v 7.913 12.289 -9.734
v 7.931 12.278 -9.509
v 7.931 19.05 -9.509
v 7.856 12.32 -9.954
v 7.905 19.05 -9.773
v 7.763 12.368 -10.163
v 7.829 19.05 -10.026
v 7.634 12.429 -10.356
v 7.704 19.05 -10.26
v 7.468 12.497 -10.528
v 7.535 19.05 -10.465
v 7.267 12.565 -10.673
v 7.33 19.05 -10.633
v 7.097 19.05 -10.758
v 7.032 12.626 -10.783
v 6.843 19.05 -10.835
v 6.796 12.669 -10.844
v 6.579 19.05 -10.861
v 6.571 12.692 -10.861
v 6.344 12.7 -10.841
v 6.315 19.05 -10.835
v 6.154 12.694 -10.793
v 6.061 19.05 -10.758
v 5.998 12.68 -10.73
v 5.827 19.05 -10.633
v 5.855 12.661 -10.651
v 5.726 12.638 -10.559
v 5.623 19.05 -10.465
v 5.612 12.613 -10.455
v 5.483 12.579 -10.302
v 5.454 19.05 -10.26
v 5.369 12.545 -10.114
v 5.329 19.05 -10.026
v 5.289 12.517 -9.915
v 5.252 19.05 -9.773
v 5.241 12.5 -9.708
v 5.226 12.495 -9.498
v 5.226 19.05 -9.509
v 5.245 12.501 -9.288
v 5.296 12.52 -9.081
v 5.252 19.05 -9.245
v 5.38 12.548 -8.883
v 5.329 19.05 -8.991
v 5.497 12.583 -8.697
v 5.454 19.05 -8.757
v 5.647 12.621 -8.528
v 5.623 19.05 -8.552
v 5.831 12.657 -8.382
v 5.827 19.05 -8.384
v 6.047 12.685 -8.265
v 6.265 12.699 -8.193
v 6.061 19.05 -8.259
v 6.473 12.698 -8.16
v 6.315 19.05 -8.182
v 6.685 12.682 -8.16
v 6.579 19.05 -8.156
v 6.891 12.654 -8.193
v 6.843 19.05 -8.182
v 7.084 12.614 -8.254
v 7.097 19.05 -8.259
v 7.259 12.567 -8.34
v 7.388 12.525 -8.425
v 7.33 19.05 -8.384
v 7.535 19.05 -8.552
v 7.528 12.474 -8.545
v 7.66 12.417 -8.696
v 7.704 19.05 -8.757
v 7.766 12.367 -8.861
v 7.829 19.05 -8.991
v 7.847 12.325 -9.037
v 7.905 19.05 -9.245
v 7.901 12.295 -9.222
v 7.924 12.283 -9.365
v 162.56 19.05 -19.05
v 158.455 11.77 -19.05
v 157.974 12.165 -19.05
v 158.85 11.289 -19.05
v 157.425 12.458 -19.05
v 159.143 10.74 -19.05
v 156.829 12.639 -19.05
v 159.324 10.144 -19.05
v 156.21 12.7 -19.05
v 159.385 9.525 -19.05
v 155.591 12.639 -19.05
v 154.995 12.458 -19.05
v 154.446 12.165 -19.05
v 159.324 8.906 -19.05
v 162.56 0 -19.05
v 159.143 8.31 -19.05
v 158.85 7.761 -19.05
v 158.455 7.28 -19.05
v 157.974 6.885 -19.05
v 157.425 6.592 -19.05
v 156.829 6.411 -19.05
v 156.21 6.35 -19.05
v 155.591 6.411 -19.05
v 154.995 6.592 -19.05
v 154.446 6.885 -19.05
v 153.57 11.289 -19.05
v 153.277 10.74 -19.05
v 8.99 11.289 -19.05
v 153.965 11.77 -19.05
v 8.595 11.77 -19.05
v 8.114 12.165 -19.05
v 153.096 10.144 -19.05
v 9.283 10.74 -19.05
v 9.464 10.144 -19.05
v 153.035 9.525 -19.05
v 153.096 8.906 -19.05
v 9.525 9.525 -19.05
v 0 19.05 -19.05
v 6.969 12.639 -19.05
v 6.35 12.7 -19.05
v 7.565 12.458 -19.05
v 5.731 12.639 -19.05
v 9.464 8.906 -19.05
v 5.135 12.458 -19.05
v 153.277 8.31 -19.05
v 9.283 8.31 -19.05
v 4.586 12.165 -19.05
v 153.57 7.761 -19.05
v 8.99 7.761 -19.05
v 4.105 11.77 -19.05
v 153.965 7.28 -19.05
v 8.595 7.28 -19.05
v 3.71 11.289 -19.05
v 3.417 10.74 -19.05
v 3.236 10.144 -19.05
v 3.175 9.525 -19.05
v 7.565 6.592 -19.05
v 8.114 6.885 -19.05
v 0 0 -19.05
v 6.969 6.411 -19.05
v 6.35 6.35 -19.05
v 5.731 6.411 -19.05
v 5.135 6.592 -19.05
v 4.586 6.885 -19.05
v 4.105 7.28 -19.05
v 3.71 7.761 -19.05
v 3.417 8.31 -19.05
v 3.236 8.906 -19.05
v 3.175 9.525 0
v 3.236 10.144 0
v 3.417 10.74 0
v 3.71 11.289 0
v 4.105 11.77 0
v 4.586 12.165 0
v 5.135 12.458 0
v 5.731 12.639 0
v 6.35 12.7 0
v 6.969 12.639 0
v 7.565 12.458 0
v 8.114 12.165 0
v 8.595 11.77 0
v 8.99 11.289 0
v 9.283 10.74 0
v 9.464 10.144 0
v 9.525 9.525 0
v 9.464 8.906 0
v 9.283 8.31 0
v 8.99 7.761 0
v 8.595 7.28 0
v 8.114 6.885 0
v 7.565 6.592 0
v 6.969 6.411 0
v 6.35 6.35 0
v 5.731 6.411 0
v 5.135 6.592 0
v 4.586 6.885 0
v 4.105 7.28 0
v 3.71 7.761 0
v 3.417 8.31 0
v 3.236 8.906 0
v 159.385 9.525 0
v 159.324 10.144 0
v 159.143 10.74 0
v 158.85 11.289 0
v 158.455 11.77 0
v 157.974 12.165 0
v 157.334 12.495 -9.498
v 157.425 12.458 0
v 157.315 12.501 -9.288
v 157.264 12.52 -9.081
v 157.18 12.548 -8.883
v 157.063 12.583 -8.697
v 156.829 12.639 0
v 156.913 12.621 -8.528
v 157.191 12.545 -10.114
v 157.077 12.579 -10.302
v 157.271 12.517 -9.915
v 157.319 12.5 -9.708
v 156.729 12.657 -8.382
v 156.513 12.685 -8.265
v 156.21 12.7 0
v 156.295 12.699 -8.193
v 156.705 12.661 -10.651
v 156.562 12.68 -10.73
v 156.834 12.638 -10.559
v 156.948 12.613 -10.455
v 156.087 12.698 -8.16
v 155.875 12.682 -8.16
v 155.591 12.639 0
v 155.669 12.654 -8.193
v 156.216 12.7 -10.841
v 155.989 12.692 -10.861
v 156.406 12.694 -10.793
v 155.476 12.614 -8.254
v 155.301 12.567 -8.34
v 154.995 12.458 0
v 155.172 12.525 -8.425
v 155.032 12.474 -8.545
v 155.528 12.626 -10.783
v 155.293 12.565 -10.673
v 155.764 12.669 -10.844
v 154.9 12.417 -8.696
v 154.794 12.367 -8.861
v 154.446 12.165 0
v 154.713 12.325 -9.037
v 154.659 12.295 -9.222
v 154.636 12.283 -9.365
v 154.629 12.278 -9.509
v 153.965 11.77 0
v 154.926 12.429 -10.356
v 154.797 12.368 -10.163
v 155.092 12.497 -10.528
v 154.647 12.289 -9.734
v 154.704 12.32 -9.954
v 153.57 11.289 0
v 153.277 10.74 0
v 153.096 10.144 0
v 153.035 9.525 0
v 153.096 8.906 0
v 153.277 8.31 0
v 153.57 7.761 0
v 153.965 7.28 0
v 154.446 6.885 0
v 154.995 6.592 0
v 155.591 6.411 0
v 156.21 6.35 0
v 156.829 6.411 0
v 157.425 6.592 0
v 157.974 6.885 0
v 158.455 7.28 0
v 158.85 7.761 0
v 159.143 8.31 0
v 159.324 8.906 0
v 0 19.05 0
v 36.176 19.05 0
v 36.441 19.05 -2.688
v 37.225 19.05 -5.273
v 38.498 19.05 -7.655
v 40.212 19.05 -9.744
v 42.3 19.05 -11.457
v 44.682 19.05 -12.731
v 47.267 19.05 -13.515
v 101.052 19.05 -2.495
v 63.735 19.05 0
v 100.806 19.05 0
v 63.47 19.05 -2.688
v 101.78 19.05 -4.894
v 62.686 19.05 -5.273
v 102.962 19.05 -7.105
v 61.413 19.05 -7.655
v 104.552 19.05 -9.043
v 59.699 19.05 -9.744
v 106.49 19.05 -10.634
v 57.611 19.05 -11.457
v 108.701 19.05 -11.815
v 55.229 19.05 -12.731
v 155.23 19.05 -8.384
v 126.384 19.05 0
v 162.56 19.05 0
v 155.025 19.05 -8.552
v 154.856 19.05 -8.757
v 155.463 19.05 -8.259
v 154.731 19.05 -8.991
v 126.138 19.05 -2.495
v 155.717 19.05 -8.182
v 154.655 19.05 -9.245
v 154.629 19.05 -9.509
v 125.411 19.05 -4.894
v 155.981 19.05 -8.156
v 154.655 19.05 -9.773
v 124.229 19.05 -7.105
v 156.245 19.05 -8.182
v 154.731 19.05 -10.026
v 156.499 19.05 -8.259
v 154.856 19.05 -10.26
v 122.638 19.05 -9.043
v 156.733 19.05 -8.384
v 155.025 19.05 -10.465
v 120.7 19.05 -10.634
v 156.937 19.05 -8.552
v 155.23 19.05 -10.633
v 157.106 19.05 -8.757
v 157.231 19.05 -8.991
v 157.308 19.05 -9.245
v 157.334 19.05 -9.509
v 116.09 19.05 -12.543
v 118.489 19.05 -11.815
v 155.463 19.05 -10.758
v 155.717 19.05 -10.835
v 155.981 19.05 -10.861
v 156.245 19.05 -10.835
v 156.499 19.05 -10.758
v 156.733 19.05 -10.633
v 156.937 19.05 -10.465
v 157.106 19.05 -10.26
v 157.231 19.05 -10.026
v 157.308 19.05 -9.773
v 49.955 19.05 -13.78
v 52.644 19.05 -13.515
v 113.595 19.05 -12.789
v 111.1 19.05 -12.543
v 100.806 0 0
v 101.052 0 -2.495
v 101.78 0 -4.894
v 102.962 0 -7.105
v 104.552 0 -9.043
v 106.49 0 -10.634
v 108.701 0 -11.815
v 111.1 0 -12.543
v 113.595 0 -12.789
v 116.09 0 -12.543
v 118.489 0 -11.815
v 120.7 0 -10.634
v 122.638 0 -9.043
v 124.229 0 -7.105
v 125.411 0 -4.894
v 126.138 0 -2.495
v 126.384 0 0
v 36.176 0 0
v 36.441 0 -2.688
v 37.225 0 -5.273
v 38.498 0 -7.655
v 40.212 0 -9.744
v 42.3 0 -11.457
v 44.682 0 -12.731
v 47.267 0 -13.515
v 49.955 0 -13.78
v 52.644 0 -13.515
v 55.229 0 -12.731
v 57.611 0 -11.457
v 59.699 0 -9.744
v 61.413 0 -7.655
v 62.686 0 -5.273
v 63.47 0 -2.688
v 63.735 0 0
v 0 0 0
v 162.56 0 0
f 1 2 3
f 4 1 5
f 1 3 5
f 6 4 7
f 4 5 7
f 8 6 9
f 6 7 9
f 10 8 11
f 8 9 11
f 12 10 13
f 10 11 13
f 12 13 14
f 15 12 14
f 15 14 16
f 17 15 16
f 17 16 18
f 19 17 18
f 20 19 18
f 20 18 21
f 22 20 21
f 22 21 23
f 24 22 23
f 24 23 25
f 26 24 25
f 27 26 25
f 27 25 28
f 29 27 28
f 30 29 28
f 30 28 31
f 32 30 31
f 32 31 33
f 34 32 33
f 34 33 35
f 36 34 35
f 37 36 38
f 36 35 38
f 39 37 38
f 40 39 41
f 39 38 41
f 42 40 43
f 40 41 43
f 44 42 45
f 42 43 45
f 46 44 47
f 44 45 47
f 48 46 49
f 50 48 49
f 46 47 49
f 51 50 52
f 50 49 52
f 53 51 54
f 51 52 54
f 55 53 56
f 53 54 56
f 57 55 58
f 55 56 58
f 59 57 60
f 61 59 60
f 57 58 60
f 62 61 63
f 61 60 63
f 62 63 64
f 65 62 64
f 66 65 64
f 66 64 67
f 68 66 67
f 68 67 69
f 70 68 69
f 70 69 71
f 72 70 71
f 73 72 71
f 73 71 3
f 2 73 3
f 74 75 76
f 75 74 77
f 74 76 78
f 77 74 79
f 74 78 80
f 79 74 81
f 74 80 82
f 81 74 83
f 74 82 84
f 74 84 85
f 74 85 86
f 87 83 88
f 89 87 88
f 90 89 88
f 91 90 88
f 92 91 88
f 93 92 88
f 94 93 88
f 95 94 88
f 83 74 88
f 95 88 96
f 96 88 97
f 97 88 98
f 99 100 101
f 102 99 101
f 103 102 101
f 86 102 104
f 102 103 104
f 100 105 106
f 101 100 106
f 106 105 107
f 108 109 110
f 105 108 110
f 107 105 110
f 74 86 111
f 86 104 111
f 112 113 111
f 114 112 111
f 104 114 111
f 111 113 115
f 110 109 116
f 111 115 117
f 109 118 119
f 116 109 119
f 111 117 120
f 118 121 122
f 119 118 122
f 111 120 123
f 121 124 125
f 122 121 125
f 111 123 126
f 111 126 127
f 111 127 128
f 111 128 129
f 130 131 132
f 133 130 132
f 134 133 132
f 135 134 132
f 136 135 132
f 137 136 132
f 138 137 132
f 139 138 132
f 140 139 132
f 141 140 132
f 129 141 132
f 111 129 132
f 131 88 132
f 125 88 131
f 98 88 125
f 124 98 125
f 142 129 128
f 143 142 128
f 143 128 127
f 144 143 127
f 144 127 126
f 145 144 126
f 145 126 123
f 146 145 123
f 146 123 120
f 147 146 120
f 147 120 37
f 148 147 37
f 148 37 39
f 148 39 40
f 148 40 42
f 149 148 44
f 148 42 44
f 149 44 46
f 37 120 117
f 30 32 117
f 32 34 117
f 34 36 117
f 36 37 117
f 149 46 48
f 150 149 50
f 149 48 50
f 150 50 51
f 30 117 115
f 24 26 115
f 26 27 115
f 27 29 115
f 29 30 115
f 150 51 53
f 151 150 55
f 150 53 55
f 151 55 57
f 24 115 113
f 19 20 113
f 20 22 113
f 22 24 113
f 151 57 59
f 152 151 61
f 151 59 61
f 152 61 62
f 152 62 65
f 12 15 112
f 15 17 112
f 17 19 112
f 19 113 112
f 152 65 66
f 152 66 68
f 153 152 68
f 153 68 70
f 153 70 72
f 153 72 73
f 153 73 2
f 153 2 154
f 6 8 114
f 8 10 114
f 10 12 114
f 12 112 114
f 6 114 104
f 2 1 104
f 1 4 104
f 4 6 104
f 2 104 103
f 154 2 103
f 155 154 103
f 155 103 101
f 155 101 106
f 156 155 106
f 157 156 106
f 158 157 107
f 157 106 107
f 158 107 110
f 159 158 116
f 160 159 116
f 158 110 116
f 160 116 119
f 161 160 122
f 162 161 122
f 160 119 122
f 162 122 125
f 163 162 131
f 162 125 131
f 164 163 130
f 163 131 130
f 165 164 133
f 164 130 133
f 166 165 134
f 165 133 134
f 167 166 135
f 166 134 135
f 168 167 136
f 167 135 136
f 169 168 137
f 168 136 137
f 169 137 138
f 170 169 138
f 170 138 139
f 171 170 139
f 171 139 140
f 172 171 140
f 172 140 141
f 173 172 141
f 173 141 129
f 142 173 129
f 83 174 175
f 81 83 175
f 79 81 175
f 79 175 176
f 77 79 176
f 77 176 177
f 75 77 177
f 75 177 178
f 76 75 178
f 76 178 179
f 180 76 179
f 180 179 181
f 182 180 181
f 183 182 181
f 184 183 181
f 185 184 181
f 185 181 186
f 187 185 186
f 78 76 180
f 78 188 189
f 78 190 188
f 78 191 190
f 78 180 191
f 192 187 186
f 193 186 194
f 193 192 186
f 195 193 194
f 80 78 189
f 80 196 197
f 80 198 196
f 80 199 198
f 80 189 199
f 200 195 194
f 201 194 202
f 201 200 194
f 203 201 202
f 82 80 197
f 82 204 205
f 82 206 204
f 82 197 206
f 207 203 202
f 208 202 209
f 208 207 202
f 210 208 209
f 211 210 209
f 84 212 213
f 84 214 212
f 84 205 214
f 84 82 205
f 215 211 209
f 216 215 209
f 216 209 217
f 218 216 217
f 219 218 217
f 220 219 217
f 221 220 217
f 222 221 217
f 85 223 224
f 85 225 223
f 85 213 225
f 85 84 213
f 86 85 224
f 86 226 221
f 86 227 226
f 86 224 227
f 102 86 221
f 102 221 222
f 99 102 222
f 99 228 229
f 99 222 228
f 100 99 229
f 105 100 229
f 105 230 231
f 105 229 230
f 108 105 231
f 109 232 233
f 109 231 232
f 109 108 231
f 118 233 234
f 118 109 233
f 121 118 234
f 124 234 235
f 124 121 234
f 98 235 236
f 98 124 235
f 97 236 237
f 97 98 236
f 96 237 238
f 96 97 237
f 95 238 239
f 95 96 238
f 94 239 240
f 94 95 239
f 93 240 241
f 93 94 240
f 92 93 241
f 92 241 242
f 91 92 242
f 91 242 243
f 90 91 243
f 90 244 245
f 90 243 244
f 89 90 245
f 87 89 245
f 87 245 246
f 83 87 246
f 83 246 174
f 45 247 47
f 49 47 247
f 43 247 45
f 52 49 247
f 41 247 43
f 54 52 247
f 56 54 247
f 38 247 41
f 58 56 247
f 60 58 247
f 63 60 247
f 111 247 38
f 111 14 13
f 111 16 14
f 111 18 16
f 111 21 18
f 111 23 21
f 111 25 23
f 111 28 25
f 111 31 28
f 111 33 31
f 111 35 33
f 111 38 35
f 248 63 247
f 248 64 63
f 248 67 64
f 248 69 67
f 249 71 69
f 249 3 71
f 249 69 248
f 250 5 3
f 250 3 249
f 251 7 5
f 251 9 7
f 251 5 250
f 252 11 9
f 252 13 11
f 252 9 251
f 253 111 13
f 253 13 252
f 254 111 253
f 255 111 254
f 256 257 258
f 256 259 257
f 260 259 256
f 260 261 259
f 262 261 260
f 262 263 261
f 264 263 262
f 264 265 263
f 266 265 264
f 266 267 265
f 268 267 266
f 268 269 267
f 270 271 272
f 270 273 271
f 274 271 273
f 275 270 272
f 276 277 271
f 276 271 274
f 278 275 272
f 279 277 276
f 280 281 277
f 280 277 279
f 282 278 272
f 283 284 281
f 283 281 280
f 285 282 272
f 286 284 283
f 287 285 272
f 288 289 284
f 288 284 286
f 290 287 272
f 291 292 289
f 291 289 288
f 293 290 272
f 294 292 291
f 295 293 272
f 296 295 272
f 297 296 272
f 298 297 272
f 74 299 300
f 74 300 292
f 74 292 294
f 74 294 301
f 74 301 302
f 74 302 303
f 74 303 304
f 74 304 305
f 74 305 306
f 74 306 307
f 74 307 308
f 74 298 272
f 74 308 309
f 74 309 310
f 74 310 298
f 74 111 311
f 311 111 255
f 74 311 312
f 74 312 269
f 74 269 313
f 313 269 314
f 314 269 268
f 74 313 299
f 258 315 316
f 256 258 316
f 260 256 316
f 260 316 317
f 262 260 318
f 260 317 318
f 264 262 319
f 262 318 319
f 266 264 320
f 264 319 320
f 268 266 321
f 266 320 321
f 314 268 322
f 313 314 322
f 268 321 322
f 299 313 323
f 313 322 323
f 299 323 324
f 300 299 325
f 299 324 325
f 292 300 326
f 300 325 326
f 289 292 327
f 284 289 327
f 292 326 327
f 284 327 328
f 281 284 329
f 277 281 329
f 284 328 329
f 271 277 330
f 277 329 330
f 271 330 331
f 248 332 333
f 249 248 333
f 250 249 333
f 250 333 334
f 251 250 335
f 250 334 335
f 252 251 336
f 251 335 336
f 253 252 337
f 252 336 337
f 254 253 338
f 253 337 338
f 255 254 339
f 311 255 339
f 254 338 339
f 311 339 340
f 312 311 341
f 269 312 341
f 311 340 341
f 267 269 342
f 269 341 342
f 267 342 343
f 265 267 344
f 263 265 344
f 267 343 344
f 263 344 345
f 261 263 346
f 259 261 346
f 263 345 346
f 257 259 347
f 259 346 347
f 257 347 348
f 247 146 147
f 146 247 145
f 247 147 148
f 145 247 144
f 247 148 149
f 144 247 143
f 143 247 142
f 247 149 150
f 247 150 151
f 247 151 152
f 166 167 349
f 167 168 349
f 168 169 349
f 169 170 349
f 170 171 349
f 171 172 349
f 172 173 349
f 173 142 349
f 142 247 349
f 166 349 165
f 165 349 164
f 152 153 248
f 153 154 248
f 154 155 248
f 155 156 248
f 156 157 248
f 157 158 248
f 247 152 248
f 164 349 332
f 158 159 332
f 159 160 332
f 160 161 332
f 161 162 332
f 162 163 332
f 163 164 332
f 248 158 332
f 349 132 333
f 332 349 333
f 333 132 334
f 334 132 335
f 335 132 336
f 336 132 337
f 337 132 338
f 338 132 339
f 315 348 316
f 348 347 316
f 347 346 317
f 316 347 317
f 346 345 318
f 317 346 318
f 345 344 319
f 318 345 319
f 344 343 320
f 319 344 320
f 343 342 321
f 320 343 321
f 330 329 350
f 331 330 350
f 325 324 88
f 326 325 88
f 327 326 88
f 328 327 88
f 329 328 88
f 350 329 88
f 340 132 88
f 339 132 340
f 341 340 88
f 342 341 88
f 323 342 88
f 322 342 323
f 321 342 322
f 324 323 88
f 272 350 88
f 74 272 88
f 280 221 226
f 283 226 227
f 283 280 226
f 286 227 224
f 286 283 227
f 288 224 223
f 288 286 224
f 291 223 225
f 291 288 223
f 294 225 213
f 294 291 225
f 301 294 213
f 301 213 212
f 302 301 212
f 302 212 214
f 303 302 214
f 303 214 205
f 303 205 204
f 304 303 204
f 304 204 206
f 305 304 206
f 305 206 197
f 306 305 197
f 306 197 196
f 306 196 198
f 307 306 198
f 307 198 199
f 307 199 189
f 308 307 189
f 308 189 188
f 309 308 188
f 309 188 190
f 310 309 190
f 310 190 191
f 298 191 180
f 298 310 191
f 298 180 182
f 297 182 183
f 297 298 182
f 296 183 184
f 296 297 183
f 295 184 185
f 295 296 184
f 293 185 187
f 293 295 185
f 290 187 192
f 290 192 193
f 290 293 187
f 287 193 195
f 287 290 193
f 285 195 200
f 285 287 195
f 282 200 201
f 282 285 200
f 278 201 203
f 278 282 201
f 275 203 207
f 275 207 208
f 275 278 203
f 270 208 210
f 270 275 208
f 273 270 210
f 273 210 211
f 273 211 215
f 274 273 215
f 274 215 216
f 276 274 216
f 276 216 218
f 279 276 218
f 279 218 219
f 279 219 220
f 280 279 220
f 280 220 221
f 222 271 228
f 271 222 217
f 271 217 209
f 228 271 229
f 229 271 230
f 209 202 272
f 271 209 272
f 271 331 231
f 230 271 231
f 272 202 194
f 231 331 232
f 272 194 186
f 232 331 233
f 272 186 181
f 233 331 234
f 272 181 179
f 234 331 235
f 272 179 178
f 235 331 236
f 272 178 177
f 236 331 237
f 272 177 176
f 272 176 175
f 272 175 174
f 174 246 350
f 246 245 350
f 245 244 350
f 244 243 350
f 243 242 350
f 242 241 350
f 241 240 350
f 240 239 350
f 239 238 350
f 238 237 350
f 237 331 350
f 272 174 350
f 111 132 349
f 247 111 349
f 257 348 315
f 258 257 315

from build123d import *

# Parameters (mm, degrees)
BOSS_EXTRUDE3_DEPTH         = 19.05
F_1_4_0_25_DIAMETER_HOLE1_D = 6.35
F_6_32_TAPPED_HOLE1_REACH   = 166.777
F_6_32_TAPPED_HOLE1_BORE_R  = 1.35255


with BuildPart() as part:
    # Sketch1 → Boss-Extrude3 (new body)
    with BuildSketch(Plane(origin=(0, 0, 0), x_dir=(1, 0, 0), z_dir=(0, 1, 0))):
        with BuildLine():
            Line((63.73495, 0), (100.80625, 0))
            ThreePointArc((100.80625, 0), (113.59515, 12.7889), (126.38405, 0))
            Line((126.38405, 0), (162.56, 0))
            Line((162.56, 0), (162.56, 19.05))
            Line((162.56, 19.05), (0, 19.05))
            Line((0, 19.05), (0, 0))
            Line((0, 0), (36.17595, 0))
            ThreePointArc((36.17595, 0), (49.95545, 13.7795), (63.73495, 0))
        make_face()
    extrude(amount=BOSS_EXTRUDE3_DEPTH)

    # 1/4 (0.25) Diameter Hole1 (through all)
    with Locations(Plane.XY):
        with Locations((6.35, 9.525)):
            f_1_4_0_25_diameter_hole1 = Hole(F_1_4_0_25_DIAMETER_HOLE1_D / 2)

    # #6-32 Tapped Hole1 bore → #6-32 Tapped Hole1 (cut, up to next)
    with BuildSketch(Plane(origin=(0, 19.05, 0), x_dir=(1, 0, 0), z_dir=(0, 1, 0)), mode=Mode.PRIVATE) as f_6_32_tapped_hole1_sk1:
        with Locations((6.578923223, 9.508761569)):
            Circle(F_6_32_TAPPED_HOLE1_BORE_R)
    f_6_32_tapped_hole1_tool1 = extrude(f_6_32_tapped_hole1_sk1.sketch, amount=-F_6_32_TAPPED_HOLE1_REACH, mode=Mode.PRIVATE) & part.part
    f_6_32_tapped_hole1 = f_6_32_tapped_hole1_tool1.solids().sort_by_distance((6.578923, 19.05, -9.508762))[0]
    add(f_6_32_tapped_hole1, mode=Mode.SUBTRACT)

    # Mirror1: 1/4 (0.25) Diameter Hole1, #6-32 Tapped Hole1 across plane
    add(f_1_4_0_25_diameter_hole1.mirror(Plane.ZY.offset(-81.28)), mode=Mode.SUBTRACT)
    add(f_6_32_tapped_hole1.mirror(Plane.ZY.offset(-81.28)), mode=Mode.SUBTRACT)


solid = part.part
